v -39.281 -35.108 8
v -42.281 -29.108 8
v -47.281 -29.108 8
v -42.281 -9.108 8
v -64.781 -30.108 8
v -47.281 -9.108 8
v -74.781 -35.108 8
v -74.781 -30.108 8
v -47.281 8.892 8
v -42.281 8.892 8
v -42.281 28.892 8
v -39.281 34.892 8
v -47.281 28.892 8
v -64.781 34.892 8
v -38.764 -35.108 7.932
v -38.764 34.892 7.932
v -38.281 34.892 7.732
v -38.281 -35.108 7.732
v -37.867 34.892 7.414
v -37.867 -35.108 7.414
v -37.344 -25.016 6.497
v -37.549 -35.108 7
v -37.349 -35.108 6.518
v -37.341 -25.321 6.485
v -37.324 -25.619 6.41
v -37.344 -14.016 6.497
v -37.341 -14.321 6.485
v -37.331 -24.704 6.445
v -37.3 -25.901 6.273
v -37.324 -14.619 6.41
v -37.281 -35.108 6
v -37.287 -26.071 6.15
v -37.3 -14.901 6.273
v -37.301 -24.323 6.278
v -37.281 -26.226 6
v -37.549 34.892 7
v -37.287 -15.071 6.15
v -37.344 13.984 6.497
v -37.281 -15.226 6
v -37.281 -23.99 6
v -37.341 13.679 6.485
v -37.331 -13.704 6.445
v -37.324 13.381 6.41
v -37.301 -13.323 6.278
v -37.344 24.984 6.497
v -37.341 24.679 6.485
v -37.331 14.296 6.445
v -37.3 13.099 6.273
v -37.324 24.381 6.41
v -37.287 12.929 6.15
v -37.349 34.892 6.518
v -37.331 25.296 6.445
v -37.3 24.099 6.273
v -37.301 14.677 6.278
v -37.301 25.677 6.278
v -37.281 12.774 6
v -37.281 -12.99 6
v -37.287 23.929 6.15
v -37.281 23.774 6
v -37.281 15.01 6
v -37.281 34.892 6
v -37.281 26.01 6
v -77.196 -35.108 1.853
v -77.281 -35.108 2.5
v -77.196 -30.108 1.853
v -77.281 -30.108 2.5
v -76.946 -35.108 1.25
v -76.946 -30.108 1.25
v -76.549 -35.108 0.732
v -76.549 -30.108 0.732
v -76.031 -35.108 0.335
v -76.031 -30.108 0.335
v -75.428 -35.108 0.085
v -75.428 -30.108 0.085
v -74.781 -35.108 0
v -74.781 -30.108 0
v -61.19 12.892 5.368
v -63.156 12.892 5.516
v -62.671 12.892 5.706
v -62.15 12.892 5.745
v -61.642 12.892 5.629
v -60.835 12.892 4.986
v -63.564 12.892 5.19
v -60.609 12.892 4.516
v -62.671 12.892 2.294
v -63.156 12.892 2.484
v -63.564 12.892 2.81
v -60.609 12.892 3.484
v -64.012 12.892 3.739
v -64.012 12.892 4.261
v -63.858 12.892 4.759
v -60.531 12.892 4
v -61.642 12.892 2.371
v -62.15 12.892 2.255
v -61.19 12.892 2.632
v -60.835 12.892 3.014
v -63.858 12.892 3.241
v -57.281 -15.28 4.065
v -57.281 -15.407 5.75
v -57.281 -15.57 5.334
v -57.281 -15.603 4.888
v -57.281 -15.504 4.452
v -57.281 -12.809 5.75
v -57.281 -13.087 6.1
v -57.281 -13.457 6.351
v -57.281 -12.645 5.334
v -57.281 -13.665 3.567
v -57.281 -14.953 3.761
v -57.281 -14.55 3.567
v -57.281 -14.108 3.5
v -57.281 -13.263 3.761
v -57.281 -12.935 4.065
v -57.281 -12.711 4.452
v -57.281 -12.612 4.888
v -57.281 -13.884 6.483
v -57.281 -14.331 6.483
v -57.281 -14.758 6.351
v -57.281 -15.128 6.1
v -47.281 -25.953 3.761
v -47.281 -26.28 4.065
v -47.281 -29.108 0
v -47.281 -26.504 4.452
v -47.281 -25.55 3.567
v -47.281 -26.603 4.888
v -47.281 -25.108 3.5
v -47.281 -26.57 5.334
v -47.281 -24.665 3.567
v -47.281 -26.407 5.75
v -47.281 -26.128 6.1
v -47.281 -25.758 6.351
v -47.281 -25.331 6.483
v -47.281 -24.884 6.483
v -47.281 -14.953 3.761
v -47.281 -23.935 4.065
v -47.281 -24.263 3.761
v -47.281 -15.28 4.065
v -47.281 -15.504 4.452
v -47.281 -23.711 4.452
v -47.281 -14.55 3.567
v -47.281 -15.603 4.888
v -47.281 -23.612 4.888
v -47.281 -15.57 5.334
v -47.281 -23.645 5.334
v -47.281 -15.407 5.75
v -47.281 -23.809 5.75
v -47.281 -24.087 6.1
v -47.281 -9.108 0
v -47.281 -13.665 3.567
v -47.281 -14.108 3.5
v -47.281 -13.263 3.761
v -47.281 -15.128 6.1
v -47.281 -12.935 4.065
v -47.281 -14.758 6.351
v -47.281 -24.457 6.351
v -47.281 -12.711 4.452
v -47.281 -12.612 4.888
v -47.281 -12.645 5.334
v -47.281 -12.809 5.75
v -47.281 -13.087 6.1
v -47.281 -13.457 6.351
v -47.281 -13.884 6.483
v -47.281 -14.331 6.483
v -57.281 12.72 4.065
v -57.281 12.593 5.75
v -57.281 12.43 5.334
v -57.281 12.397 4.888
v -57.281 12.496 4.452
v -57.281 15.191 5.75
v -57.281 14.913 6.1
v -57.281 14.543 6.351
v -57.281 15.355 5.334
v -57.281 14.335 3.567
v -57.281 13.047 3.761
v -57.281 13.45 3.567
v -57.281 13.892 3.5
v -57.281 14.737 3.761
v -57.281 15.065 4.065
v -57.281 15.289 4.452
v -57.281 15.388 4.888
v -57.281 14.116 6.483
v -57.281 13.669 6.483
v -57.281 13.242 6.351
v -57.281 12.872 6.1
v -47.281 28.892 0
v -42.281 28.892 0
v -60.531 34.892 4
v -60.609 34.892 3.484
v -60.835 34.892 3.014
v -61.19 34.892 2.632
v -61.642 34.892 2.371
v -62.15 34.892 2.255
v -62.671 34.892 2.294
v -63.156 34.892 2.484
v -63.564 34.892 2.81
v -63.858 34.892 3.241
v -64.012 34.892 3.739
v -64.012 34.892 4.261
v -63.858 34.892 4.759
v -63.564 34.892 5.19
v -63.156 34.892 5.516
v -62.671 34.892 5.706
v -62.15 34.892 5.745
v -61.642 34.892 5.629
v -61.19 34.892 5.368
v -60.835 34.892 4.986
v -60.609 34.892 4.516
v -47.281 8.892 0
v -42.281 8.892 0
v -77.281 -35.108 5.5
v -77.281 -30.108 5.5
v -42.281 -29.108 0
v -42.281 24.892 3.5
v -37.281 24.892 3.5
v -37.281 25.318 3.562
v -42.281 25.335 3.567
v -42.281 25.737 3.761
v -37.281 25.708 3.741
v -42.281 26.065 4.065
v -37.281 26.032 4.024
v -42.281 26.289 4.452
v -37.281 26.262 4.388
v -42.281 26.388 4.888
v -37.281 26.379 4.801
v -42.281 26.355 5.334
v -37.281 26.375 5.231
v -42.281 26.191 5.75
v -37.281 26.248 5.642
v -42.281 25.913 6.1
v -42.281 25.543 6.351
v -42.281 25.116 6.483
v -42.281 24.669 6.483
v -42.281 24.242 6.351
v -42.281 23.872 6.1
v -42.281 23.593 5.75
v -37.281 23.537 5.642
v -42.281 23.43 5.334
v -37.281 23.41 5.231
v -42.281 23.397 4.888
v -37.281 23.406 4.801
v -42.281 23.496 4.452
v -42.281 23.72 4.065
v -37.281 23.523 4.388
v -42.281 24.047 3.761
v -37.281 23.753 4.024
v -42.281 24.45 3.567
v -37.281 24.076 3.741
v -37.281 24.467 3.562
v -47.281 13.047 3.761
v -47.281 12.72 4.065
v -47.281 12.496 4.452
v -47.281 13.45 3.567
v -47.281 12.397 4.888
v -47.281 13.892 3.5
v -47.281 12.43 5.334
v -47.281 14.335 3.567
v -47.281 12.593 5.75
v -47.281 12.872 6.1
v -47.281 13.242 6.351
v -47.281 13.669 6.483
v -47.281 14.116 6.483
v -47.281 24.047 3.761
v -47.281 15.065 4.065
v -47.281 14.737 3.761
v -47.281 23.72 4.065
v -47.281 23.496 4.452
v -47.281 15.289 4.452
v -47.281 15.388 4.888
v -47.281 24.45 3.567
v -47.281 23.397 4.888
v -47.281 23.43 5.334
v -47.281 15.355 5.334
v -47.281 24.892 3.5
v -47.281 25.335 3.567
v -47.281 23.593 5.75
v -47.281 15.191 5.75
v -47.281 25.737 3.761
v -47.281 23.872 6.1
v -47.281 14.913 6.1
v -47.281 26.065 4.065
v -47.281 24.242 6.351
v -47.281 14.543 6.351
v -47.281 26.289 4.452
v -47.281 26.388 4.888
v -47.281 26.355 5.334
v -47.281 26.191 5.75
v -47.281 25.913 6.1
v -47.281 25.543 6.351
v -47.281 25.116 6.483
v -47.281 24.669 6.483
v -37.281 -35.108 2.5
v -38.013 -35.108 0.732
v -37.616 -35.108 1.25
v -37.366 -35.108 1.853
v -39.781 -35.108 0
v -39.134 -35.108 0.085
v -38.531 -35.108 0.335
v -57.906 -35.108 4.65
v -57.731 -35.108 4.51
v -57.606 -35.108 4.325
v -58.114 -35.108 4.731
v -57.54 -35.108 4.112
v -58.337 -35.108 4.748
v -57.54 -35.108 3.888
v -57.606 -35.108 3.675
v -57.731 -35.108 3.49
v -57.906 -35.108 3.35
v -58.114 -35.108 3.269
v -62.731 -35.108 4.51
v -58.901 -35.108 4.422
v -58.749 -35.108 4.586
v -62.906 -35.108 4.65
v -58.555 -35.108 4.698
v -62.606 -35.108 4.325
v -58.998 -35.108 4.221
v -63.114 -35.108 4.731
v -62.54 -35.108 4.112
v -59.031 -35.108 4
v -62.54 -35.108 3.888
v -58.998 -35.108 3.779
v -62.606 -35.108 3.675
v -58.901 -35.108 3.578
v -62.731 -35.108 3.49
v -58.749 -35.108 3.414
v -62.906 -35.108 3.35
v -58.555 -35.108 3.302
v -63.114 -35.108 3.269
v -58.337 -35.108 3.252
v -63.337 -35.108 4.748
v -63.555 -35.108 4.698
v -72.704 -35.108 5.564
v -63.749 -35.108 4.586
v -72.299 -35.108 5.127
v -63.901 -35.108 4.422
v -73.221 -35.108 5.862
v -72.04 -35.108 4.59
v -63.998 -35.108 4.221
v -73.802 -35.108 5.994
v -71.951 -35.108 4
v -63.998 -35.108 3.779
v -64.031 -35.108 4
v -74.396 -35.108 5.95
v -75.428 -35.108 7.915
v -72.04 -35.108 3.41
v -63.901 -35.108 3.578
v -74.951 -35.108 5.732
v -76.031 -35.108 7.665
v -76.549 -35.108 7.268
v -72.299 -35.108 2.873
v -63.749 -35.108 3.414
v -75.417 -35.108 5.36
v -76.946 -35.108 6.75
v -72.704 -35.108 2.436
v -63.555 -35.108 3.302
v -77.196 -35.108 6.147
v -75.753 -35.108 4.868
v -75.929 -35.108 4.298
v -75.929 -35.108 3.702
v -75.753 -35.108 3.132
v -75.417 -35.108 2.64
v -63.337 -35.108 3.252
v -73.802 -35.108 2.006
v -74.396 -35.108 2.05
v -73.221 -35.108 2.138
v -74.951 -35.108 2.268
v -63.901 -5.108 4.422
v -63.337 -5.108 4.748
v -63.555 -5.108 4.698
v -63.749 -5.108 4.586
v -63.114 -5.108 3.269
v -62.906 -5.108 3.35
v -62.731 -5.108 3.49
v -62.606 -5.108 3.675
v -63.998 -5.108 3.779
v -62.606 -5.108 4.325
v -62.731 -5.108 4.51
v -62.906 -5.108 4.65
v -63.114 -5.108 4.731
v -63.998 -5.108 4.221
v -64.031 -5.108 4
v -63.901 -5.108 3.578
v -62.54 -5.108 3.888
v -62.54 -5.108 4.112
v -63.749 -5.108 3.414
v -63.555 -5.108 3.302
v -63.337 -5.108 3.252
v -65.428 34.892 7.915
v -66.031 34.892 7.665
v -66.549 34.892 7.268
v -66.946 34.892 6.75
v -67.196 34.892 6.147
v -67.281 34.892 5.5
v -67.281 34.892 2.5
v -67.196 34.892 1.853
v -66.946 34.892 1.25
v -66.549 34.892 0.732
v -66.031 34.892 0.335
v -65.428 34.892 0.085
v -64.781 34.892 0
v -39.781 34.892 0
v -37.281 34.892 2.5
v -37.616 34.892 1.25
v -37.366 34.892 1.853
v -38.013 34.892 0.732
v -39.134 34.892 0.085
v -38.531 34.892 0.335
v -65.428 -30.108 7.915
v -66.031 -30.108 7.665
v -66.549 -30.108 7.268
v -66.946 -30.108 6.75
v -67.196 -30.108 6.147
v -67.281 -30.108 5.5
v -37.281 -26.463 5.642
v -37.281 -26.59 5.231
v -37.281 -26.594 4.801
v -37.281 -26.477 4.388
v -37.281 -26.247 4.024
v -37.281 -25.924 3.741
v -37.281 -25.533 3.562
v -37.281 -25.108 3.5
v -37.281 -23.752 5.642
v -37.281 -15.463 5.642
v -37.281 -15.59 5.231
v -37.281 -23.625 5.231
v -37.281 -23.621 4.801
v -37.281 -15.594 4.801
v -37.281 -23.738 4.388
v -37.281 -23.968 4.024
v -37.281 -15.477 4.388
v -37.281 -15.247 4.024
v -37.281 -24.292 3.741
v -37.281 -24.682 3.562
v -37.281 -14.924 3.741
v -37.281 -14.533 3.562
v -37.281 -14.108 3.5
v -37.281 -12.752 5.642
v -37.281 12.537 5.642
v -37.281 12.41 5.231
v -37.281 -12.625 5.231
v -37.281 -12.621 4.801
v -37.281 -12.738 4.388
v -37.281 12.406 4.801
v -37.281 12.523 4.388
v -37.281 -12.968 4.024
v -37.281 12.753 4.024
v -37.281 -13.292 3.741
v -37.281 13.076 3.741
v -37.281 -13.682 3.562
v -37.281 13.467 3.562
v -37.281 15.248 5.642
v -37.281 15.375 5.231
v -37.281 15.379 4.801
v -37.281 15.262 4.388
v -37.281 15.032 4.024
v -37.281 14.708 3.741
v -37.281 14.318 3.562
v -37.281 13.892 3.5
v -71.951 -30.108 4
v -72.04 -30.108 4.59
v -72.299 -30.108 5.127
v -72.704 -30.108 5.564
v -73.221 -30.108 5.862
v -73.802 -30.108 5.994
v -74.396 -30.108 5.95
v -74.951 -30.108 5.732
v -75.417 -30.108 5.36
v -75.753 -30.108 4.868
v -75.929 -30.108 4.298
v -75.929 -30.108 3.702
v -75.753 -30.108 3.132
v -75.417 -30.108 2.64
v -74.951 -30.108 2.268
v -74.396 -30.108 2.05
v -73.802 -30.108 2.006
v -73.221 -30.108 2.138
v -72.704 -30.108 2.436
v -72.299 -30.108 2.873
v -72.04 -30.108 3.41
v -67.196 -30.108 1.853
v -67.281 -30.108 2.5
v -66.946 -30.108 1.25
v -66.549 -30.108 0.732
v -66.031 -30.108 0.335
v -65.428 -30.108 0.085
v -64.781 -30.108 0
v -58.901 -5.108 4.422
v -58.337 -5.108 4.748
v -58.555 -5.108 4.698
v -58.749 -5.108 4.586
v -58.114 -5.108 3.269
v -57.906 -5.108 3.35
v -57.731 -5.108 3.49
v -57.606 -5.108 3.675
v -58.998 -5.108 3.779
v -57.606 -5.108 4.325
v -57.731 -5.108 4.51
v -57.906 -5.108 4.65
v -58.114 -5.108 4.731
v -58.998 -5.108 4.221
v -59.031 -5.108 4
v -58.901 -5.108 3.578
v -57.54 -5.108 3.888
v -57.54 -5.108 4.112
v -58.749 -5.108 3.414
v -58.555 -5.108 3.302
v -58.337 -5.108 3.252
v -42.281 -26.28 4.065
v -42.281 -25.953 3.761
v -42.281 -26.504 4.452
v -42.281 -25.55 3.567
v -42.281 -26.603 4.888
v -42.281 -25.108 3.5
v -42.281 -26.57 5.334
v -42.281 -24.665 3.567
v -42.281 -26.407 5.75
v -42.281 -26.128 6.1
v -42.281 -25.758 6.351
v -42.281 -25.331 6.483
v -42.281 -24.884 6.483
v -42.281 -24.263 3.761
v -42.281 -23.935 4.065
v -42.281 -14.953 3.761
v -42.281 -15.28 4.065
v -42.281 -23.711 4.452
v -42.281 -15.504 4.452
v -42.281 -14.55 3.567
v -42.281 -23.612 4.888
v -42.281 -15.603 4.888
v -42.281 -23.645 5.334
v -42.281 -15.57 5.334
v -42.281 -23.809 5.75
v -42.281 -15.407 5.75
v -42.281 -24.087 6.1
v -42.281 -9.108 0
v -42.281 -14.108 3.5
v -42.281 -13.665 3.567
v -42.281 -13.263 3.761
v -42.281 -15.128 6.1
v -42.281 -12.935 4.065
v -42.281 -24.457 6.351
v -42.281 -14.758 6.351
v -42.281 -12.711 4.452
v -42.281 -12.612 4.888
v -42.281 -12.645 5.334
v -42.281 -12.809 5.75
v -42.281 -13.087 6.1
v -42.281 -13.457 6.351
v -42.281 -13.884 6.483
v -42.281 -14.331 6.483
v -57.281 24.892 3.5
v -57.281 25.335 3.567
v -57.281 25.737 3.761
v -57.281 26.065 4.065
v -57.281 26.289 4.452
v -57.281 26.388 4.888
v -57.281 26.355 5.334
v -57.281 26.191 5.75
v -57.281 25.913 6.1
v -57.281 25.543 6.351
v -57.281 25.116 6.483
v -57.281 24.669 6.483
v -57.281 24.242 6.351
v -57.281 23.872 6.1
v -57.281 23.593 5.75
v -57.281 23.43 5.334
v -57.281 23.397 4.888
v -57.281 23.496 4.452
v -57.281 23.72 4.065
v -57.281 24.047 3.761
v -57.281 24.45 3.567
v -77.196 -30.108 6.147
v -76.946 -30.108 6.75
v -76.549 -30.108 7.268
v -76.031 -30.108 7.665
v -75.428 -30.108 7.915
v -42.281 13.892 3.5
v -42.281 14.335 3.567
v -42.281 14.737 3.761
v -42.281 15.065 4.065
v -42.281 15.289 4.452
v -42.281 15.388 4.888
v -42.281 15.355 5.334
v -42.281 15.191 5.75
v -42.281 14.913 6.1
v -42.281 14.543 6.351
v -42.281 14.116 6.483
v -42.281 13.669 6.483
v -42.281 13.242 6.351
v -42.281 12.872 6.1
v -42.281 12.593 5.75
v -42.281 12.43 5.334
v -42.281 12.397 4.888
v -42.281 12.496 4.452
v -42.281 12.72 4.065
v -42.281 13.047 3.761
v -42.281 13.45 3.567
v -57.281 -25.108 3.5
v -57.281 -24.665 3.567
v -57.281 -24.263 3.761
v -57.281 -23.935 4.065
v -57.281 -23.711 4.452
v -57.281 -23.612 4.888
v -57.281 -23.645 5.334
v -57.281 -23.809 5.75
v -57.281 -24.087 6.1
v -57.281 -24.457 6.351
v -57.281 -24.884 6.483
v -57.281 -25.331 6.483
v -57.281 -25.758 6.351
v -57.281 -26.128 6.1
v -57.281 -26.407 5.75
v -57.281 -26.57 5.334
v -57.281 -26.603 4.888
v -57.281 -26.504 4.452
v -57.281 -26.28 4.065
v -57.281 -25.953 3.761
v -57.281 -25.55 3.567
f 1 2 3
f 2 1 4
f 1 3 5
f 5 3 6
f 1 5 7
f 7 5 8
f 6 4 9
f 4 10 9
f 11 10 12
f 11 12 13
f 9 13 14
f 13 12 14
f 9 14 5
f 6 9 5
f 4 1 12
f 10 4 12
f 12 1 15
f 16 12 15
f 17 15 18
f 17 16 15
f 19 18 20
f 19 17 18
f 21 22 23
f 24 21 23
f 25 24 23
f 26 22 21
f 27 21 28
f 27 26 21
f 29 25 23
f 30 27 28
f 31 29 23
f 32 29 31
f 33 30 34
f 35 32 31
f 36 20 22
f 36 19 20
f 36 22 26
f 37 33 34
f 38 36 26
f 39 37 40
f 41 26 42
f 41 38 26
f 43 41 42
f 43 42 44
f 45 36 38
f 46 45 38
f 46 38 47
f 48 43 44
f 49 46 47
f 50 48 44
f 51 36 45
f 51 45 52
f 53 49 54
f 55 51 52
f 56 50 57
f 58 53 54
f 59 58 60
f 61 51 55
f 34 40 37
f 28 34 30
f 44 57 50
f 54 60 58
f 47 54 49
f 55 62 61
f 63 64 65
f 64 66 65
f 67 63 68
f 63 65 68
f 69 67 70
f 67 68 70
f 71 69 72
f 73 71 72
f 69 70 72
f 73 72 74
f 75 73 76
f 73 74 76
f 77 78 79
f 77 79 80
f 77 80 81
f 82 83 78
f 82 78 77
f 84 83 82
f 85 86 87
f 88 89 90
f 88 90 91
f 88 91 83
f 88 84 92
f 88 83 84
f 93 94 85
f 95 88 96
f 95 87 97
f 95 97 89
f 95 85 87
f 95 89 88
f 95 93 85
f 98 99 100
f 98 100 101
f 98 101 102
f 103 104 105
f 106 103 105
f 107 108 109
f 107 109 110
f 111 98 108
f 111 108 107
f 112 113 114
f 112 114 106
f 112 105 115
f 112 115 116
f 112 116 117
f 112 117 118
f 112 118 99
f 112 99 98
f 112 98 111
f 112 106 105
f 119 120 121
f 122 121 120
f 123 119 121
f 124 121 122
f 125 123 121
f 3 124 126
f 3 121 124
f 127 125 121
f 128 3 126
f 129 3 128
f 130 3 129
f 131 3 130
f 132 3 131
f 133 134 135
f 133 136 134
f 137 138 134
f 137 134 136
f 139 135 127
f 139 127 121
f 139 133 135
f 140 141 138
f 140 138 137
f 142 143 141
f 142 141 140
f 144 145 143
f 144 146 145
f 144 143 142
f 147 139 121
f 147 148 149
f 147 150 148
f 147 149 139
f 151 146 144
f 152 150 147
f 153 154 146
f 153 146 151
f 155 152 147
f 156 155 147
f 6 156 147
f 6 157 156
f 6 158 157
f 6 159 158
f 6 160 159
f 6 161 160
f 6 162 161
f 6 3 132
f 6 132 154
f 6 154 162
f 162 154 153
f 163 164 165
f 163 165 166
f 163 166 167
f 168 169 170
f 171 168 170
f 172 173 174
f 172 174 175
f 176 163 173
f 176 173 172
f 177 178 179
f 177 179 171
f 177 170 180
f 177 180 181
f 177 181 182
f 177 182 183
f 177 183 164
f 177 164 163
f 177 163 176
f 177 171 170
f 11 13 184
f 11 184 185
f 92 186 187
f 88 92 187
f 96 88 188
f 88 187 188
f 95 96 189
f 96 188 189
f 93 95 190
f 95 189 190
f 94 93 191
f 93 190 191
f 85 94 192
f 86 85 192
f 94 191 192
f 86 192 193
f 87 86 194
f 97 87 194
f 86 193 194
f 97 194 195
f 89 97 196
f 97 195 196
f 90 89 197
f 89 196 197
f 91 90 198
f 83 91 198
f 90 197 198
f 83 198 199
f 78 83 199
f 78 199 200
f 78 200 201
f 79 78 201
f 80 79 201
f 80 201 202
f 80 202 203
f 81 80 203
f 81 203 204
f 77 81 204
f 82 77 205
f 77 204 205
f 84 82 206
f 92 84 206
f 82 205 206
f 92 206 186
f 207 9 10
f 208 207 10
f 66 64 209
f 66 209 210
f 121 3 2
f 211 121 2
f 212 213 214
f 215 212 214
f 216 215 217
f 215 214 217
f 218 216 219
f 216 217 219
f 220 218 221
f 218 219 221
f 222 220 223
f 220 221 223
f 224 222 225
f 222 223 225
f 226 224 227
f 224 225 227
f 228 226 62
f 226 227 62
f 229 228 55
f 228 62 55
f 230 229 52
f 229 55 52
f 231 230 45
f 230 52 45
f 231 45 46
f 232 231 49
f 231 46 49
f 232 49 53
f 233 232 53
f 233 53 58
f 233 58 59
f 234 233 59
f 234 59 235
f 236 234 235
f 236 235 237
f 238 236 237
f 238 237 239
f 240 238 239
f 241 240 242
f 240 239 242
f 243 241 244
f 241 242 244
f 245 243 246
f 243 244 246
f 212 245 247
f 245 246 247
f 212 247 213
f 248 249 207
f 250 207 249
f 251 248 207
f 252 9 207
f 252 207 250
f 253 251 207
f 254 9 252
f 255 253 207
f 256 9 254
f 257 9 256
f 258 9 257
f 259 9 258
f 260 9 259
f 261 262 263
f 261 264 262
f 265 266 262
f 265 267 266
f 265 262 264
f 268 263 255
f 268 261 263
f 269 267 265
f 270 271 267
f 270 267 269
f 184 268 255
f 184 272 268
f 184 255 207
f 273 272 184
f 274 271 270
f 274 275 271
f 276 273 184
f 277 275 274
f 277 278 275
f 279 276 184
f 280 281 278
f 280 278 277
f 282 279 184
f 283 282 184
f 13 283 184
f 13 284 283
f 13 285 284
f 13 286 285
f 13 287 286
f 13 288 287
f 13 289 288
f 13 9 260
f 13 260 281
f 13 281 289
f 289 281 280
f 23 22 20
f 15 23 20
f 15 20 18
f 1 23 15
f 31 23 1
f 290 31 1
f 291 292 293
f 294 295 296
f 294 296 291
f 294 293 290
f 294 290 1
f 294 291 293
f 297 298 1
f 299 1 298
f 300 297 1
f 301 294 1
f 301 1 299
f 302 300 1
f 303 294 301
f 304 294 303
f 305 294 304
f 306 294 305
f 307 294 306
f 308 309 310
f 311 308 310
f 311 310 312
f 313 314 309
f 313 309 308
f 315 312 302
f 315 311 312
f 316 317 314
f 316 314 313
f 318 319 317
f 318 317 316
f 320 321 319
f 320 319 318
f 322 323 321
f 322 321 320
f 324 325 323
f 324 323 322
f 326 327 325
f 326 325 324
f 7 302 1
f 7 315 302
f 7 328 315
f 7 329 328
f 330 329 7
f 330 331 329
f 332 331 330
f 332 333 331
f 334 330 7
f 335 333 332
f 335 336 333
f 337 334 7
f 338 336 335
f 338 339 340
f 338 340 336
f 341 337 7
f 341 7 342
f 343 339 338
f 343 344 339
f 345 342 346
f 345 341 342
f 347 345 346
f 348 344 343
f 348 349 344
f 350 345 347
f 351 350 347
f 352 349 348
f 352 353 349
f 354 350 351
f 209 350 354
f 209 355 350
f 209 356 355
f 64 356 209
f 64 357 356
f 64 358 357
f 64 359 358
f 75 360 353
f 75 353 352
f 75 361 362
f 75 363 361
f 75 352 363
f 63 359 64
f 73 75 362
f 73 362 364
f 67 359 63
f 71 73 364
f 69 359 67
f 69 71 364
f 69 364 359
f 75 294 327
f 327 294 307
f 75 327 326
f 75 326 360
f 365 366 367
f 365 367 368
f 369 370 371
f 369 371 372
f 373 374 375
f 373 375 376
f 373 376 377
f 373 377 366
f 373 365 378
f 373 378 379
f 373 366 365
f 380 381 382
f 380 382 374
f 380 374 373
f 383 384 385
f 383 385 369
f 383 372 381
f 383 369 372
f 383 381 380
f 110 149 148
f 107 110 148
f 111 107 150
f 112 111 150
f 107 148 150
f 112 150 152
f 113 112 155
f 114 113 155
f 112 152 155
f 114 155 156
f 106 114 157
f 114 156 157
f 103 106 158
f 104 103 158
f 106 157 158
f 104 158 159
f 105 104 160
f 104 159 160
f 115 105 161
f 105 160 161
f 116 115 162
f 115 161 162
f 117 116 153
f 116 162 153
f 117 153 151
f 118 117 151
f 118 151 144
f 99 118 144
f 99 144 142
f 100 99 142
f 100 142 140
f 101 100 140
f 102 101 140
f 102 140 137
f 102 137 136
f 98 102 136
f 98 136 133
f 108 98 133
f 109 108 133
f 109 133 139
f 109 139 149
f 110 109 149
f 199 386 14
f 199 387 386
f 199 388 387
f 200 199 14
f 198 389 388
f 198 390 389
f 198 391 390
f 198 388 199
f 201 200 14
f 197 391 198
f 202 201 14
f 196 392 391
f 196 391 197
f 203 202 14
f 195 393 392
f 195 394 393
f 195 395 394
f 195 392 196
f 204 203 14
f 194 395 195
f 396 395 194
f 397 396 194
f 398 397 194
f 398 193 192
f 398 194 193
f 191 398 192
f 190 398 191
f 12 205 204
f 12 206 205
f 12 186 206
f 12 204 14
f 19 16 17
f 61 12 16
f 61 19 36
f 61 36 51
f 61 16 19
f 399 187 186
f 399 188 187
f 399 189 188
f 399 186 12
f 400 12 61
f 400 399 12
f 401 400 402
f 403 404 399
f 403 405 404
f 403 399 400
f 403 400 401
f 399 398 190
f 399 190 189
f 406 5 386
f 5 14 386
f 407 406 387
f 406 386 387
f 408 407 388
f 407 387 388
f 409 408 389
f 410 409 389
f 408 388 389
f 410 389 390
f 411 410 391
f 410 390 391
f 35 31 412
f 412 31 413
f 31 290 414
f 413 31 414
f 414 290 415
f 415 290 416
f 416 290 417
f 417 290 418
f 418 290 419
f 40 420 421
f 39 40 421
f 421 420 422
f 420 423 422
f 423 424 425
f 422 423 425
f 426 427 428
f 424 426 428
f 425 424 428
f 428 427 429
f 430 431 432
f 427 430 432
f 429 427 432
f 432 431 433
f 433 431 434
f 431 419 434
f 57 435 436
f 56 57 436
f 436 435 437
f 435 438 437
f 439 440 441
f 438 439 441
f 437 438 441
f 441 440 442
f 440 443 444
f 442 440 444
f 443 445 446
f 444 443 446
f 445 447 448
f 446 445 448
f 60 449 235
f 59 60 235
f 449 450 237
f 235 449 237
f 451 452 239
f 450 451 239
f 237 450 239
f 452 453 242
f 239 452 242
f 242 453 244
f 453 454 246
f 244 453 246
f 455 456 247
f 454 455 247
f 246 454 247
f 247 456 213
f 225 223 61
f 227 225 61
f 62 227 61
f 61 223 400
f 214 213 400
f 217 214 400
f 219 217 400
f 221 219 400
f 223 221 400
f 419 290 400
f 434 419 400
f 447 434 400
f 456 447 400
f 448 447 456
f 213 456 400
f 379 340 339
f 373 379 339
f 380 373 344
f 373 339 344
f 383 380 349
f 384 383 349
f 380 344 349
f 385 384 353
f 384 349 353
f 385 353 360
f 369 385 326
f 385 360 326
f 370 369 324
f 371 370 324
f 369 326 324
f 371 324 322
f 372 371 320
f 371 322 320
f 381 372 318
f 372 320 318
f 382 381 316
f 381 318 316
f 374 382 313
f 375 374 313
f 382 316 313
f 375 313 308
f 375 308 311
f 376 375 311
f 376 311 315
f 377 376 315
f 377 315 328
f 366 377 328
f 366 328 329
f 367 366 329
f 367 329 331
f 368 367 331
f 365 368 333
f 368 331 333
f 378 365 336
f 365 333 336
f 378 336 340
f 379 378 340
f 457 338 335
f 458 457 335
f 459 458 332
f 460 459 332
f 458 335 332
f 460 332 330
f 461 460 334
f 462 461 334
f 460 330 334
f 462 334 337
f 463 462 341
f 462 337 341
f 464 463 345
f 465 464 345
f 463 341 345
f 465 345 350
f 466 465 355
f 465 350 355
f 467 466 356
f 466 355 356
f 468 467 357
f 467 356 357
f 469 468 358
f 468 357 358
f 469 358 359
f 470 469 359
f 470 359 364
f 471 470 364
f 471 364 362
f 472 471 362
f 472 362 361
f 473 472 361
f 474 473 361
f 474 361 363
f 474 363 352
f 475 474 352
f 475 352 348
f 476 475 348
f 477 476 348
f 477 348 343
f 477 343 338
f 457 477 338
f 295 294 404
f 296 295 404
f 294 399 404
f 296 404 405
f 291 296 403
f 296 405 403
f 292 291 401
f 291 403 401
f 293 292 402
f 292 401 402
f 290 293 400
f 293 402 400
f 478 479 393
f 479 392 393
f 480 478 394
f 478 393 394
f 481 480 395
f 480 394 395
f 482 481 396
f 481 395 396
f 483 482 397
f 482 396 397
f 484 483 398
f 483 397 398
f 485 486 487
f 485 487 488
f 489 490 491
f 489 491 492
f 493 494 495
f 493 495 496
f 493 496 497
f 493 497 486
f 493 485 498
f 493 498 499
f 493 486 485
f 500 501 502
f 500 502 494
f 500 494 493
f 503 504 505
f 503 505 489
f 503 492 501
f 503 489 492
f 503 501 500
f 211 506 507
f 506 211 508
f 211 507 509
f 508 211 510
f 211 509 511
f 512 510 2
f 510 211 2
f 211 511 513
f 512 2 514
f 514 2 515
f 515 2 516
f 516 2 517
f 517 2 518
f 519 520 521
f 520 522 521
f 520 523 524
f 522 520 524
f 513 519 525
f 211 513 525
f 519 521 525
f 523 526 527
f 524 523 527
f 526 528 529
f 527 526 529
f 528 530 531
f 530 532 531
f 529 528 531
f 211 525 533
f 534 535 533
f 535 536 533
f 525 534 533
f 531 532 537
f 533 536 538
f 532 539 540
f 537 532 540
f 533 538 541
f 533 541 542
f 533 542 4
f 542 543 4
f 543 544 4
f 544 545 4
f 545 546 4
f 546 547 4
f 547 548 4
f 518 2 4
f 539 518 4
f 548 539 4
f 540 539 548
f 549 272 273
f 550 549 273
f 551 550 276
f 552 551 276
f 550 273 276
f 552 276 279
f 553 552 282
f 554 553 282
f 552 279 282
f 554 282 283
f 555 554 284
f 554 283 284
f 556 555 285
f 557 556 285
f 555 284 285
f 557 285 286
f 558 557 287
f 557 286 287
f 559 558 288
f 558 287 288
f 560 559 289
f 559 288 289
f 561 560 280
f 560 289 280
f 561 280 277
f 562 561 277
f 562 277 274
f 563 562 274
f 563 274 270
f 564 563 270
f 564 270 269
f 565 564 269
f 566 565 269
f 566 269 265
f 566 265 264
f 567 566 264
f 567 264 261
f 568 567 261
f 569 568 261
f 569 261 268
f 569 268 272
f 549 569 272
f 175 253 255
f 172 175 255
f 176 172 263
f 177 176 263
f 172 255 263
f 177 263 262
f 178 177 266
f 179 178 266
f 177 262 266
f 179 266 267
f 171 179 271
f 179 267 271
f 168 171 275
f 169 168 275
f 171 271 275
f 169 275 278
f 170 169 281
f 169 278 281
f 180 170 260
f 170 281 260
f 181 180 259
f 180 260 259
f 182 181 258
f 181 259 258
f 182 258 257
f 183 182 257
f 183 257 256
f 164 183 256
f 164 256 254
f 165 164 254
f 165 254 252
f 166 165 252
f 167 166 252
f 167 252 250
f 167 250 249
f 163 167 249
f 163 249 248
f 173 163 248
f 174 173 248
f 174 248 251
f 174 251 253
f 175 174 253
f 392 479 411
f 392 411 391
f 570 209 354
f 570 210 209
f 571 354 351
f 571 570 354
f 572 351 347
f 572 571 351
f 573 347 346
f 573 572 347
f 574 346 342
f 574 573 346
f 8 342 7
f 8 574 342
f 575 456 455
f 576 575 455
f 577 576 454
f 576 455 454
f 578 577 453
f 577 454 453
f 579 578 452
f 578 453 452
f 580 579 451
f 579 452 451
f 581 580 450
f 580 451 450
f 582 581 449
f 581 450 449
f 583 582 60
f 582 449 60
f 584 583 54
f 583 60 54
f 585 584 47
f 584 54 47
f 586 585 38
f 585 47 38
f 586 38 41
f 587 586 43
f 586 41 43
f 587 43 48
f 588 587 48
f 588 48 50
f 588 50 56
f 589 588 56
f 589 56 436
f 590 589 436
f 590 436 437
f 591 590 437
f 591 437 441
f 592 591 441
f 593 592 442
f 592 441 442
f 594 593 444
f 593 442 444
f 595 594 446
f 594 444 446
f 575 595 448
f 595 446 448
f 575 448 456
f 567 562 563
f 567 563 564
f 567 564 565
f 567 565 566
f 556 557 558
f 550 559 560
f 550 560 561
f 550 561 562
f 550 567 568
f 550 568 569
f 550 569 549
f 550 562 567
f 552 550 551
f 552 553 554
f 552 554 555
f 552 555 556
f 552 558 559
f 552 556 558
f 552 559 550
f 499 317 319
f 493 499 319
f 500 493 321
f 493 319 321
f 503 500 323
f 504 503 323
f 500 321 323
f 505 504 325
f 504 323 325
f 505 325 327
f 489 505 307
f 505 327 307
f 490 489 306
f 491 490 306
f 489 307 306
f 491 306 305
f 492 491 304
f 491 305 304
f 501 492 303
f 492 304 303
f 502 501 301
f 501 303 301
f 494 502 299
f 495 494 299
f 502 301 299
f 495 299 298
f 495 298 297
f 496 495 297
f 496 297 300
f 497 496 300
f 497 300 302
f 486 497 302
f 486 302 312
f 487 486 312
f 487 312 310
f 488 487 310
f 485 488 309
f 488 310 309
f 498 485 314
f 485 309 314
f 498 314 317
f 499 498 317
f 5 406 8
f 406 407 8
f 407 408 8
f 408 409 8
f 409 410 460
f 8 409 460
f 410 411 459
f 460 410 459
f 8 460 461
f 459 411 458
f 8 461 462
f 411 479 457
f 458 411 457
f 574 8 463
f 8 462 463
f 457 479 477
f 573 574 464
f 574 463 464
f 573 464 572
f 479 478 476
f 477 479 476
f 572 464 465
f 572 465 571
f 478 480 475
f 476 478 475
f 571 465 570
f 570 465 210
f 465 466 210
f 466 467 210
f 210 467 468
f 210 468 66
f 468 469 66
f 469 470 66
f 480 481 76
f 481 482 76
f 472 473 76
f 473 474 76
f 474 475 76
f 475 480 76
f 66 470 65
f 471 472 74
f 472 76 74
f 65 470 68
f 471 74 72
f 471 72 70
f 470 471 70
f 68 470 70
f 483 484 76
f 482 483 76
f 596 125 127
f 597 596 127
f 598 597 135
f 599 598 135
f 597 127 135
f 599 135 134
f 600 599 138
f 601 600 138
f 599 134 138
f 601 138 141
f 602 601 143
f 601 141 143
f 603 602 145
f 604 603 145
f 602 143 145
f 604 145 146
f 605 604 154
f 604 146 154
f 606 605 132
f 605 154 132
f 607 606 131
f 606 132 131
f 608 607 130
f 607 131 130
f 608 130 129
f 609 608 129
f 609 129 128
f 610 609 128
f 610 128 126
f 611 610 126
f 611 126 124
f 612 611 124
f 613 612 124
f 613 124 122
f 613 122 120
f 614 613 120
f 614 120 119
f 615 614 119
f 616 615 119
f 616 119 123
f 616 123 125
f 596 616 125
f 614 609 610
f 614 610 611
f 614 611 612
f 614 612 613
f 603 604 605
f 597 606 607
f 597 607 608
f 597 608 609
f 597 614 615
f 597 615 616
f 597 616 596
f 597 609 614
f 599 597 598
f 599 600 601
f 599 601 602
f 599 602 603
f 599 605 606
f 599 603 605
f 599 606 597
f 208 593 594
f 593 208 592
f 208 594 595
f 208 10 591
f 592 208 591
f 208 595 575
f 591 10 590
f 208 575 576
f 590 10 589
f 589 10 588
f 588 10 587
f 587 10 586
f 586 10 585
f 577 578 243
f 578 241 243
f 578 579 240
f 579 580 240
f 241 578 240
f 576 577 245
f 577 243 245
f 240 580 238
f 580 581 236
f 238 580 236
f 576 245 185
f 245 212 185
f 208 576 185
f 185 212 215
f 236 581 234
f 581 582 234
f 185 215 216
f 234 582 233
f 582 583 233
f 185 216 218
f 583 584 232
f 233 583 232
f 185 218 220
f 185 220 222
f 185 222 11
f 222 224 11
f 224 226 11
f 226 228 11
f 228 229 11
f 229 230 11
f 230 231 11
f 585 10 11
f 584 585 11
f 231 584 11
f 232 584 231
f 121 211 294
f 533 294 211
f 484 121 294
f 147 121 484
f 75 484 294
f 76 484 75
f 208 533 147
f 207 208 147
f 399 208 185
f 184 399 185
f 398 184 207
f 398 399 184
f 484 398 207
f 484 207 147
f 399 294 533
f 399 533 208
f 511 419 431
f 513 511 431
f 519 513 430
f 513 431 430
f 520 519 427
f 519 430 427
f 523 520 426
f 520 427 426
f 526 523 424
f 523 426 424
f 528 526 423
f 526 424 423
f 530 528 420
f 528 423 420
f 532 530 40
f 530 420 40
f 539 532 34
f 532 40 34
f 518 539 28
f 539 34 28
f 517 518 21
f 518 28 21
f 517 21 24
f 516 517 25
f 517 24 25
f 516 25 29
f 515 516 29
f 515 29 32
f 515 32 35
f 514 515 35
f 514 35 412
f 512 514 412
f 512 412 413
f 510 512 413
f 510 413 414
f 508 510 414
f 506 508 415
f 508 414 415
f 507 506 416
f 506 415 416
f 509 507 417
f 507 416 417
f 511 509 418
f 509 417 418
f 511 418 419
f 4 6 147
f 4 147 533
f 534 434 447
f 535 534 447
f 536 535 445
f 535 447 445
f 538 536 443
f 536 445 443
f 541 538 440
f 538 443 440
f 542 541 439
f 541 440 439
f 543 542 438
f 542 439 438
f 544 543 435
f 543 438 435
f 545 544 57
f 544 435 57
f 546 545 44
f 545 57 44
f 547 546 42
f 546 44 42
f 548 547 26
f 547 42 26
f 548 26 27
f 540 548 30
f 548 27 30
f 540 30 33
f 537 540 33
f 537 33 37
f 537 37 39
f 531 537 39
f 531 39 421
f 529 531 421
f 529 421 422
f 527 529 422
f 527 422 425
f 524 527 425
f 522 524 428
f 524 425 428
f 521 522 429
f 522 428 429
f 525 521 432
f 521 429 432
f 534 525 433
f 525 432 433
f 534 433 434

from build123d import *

# Parameters (mm, degrees)
ESBO_O2_W                = 30
ESBO_O2_H                = 70
RESSALTO_EXTRUS_O1_DEPTH = 8
ESBO_O3_R                = 0.75
CORTE_EXTRUS_O1_DEPTH    = 30
FILETE1_R                = 2
ESBO_O17_W               = 10
ESBO_O17_H               = 5
RESSALTO_EXTRUS_O4_DEPTH = 8
ESBO_O20_R               = 2
CORTE_EXTRUS_O9_DEPTH    = 8
FILETE2_R                = 2.5
FILETE3_R                = 2.5
FILETE4_R                = 2.5
FILETE5_R                = 2.5
ESBO_O21_W               = 5
ESBO_O21_H               = 20
CORTE_EXTRUS_O10_DEPTH   = 9
FILETE6_R                = 2.5
ESBO_O22_R               = 1.5
CORTE_EXTRUS_O11_DEPTH   = 20
ESBO_O23_R               = 1.75
CORTE_EXTRUS_O12_DEPTH   = 22


with BuildPart() as part:
    # Esboço2 → Ressalto-extrusão1 (new body)
    with BuildSketch(Plane.XY):
        with Locations((-52.281248797, -0.107598663)):
            Rectangle(ESBO_O2_W, ESBO_O2_H)
    extrude(amount=RESSALTO_EXTRUS_O1_DEPTH)

    # Esboço3 → Corte-extrusão1 (cut)
    with BuildSketch(Plane(origin=(0, -35.107598663, 0), x_dir=(-1, 0, 0), z_dir=(0, -1, 0))):
        with Locations((58.281248797, -4)):
            Circle(ESBO_O3_R)
        with Locations((63.281248797, -4)):
            Circle(ESBO_O3_R)
    extrude(amount=-CORTE_EXTRUS_O1_DEPTH, mode=Mode.SUBTRACT)

    # Filete1
    filete1_edges = [part.edges().sort_by_distance(p)[0] for p in [
        (-37.281248797, -0.107598663, 8),
    ]]
    fillet(filete1_edges, radius=FILETE1_R)

    # Esboço17 → Ressalto-extrusão4 (add)
    with BuildSketch(Plane(origin=(0, 0, 0), x_dir=(-1, 0, 0), z_dir=(0, 0, -1))):
        with Locations((72.281248797, -32.607598663)):
            Rectangle(ESBO_O17_W, ESBO_O17_H)
    extrude(amount=-RESSALTO_EXTRUS_O4_DEPTH)

    # Esboço20 → Corte-extrusão9 (cut)
    with BuildSketch(Plane.XZ.offset(35.107598663)):
        with Locations((-73.951248797, 4)):
            Circle(ESBO_O20_R)
    extrude(amount=-CORTE_EXTRUS_O9_DEPTH, mode=Mode.SUBTRACT)

    # Filete2
    filete2_edges = [part.edges().sort_by_distance(p)[0] for p in [
        (-67.281248797, 2.392401337, 8),
    ]]
    fillet(filete2_edges, radius=FILETE2_R)

    # Filete3
    filete3_edges = [part.edges().sort_by_distance(p)[0] for p in [
        (-67.281248797, 2.392401337, 0),
    ]]
    fillet(filete3_edges, radius=FILETE3_R)

    # Filete4
    filete4_edges = [part.edges().sort_by_distance(p)[0] for p in [
        (-77.281248797, -32.607598663, 8),
    ]]
    fillet(filete4_edges, radius=FILETE4_R)

    # Filete5
    filete5_edges = [part.edges().sort_by_distance(p)[0] for p in [
        (-77.281248797, -32.607598663, 0),
    ]]
    fillet(filete5_edges, radius=FILETE5_R)

    # Esboço21 → Corte-extrusão10 (cut, through all)
    with BuildSketch(Plane.XY.offset(8)):
        with Locations((-44.781248797, 18.892401337)):
            Rectangle(ESBO_O21_W, ESBO_O21_H)
        with Locations((-44.781248797, -19.107598663)):
            Rectangle(ESBO_O21_W, ESBO_O21_H)
    extrude(amount=-CORTE_EXTRUS_O10_DEPTH, mode=Mode.SUBTRACT)

    # Filete6
    filete6_edges = [part.edges().sort_by_distance(p)[0] for p in [
        (-37.281248797, -0.107598663, 0),
    ]]
    fillet(filete6_edges, radius=FILETE6_R)

    # Esboço22 → Corte-extrusão11 (cut)
    with BuildSketch(Plane(origin=(-37.281248797, 0, 0), x_dir=(0, 0, -1), z_dir=(1, 0, 0))):
        with Locations((-5, -25.107598663)):
            Circle(ESBO_O22_R)
        with Locations((-5, -14.107598663)):
            Circle(ESBO_O22_R)
        with Locations((-5, 24.892401337)):
            Circle(ESBO_O22_R)
        with Locations((-5, 13.892401337)):
            Circle(ESBO_O22_R)
    extrude(amount=-CORTE_EXTRUS_O11_DEPTH, mode=Mode.SUBTRACT)

    # Esboço23 → Corte-extrusão12 (cut)
    with BuildSketch(Plane(origin=(0, 34.892401337, 0), x_dir=(1, 0, 0), z_dir=(0, 1, 0))):
        with Locations((-62.281248797, -4)):
            Circle(ESBO_O23_R)
    extrude(amount=-CORTE_EXTRUS_O12_DEPTH, mode=Mode.SUBTRACT)


solid = part.part
